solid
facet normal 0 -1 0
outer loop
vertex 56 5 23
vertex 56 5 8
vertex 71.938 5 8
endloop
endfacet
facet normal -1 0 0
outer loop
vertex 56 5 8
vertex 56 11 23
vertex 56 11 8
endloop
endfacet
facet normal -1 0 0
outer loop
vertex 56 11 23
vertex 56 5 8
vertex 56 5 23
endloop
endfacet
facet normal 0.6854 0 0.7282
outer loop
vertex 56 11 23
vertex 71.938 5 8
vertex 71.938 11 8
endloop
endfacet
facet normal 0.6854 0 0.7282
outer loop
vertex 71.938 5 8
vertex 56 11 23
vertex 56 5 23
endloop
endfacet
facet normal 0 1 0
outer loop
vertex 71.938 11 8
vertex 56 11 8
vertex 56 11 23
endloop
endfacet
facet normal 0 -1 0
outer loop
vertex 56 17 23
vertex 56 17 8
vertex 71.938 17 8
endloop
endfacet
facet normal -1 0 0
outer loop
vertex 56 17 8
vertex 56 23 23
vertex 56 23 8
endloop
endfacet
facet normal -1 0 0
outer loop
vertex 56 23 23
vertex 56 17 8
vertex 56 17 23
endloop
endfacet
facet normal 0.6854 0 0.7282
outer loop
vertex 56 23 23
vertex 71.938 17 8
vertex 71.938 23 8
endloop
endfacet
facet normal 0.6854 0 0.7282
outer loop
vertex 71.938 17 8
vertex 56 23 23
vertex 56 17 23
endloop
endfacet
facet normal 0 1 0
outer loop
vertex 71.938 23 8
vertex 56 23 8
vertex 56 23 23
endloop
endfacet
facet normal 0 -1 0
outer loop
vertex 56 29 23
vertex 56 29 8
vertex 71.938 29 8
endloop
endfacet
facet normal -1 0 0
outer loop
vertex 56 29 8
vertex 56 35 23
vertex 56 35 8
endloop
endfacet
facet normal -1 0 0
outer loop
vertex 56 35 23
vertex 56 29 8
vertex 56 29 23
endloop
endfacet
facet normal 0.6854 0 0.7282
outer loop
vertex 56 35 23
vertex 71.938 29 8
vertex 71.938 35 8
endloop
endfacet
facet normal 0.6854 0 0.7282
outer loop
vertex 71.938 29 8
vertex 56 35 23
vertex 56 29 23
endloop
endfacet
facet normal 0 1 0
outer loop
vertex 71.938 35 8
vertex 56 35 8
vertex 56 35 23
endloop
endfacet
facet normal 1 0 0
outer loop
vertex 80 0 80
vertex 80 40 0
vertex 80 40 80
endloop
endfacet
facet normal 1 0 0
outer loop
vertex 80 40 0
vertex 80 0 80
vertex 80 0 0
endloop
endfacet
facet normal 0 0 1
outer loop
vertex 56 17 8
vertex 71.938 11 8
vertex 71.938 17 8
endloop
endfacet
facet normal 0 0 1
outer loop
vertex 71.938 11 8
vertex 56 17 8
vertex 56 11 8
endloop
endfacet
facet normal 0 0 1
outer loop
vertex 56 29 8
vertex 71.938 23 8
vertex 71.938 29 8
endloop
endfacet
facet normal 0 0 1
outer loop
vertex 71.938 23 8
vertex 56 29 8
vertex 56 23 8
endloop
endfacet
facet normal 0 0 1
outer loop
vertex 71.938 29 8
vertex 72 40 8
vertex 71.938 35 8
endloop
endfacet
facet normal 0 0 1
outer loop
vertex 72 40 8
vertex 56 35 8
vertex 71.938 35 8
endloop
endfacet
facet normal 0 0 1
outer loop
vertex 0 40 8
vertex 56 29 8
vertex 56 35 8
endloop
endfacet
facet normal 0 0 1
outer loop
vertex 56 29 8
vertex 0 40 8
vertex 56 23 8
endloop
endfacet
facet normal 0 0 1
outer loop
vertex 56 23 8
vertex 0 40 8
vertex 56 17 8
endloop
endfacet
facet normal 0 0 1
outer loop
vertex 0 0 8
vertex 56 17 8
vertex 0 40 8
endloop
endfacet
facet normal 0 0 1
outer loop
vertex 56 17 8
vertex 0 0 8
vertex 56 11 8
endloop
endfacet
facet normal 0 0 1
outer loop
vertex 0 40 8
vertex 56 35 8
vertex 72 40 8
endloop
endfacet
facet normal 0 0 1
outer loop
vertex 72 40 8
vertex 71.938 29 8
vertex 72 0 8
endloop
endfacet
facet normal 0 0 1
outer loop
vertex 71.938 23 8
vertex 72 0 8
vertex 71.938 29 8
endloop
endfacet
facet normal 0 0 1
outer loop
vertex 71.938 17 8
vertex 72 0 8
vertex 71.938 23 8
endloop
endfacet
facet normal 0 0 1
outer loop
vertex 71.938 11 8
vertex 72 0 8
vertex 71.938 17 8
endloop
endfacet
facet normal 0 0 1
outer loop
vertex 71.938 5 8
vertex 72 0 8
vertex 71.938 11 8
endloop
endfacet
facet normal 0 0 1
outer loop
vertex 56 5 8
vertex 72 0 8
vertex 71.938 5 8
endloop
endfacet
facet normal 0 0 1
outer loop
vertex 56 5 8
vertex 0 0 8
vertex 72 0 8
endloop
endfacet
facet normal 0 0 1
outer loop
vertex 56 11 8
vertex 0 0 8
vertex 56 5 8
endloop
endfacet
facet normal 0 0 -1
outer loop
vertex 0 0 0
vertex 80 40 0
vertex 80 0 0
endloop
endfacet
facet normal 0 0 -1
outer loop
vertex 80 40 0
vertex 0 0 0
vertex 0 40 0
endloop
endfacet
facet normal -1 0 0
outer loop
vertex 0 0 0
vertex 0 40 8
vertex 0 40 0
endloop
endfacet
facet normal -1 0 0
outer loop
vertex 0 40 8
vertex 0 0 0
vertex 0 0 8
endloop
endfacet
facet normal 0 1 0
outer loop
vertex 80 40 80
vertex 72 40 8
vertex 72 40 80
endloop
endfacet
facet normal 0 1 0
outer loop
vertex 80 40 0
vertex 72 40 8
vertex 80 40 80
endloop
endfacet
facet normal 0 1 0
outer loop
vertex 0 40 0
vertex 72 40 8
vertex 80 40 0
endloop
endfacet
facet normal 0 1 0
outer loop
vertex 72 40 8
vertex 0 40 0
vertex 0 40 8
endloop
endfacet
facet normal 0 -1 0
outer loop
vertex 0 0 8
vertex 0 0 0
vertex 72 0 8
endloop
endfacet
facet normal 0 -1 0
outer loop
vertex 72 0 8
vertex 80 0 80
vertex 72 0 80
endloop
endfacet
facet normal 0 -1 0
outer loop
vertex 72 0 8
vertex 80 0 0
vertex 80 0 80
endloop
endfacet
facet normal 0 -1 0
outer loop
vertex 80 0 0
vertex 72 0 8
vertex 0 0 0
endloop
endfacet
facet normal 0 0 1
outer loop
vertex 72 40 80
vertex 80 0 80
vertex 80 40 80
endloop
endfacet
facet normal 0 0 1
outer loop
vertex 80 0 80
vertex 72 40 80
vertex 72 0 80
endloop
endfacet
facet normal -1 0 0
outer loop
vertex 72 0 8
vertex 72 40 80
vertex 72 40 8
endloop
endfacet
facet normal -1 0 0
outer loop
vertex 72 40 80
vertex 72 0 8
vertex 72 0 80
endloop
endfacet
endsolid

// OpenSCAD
$fn = 32;

// ----------------------------------------------------------------------
// Rib bracket: 3-gusset L bracket
// ----------------------------------------------------------------------

// --- parameters (mm) ---
base_l = 80;              // foot length, X
base_w = 40;              // foot width, Y
base_t = 8;               // foot thickness
plate_t = 8;              // upright plate thickness
plate_h = 80;             // overall height
gus_l = 16;               // gusset leg along the foot
gus_h = 16;               // gusset height
gus_t = 6;                // gusset thickness
gus_edge = 5;             // gusset margin from the foot edge
n_gus = 3;                // gusset count
fit_tol = 0.05;           // tolerance for press fits, mm
free_tol = 0.2;           // tolerance for clearance fits, mm

gus_pitch = (base_w - 2 * gus_edge - gus_t) / (n_gus - 1);  // gusset pitch

union() {
  cube([base_l, base_w, base_t]);
  translate([base_l - plate_t, 0, base_t - 1])
    cube([plate_t, base_w, plate_h - base_t + 1]);
  for (i = [0 : n_gus - 1])
    translate([base_l - plate_t - gus_l, gus_edge + i * gus_pitch, base_t - 1])
      rotate([-90, 0, 0])
        linear_extrude(height = gus_t)
          polygon(points = [[0, 0], [gus_l + 1, 0], [0, -gus_h]]);
}
